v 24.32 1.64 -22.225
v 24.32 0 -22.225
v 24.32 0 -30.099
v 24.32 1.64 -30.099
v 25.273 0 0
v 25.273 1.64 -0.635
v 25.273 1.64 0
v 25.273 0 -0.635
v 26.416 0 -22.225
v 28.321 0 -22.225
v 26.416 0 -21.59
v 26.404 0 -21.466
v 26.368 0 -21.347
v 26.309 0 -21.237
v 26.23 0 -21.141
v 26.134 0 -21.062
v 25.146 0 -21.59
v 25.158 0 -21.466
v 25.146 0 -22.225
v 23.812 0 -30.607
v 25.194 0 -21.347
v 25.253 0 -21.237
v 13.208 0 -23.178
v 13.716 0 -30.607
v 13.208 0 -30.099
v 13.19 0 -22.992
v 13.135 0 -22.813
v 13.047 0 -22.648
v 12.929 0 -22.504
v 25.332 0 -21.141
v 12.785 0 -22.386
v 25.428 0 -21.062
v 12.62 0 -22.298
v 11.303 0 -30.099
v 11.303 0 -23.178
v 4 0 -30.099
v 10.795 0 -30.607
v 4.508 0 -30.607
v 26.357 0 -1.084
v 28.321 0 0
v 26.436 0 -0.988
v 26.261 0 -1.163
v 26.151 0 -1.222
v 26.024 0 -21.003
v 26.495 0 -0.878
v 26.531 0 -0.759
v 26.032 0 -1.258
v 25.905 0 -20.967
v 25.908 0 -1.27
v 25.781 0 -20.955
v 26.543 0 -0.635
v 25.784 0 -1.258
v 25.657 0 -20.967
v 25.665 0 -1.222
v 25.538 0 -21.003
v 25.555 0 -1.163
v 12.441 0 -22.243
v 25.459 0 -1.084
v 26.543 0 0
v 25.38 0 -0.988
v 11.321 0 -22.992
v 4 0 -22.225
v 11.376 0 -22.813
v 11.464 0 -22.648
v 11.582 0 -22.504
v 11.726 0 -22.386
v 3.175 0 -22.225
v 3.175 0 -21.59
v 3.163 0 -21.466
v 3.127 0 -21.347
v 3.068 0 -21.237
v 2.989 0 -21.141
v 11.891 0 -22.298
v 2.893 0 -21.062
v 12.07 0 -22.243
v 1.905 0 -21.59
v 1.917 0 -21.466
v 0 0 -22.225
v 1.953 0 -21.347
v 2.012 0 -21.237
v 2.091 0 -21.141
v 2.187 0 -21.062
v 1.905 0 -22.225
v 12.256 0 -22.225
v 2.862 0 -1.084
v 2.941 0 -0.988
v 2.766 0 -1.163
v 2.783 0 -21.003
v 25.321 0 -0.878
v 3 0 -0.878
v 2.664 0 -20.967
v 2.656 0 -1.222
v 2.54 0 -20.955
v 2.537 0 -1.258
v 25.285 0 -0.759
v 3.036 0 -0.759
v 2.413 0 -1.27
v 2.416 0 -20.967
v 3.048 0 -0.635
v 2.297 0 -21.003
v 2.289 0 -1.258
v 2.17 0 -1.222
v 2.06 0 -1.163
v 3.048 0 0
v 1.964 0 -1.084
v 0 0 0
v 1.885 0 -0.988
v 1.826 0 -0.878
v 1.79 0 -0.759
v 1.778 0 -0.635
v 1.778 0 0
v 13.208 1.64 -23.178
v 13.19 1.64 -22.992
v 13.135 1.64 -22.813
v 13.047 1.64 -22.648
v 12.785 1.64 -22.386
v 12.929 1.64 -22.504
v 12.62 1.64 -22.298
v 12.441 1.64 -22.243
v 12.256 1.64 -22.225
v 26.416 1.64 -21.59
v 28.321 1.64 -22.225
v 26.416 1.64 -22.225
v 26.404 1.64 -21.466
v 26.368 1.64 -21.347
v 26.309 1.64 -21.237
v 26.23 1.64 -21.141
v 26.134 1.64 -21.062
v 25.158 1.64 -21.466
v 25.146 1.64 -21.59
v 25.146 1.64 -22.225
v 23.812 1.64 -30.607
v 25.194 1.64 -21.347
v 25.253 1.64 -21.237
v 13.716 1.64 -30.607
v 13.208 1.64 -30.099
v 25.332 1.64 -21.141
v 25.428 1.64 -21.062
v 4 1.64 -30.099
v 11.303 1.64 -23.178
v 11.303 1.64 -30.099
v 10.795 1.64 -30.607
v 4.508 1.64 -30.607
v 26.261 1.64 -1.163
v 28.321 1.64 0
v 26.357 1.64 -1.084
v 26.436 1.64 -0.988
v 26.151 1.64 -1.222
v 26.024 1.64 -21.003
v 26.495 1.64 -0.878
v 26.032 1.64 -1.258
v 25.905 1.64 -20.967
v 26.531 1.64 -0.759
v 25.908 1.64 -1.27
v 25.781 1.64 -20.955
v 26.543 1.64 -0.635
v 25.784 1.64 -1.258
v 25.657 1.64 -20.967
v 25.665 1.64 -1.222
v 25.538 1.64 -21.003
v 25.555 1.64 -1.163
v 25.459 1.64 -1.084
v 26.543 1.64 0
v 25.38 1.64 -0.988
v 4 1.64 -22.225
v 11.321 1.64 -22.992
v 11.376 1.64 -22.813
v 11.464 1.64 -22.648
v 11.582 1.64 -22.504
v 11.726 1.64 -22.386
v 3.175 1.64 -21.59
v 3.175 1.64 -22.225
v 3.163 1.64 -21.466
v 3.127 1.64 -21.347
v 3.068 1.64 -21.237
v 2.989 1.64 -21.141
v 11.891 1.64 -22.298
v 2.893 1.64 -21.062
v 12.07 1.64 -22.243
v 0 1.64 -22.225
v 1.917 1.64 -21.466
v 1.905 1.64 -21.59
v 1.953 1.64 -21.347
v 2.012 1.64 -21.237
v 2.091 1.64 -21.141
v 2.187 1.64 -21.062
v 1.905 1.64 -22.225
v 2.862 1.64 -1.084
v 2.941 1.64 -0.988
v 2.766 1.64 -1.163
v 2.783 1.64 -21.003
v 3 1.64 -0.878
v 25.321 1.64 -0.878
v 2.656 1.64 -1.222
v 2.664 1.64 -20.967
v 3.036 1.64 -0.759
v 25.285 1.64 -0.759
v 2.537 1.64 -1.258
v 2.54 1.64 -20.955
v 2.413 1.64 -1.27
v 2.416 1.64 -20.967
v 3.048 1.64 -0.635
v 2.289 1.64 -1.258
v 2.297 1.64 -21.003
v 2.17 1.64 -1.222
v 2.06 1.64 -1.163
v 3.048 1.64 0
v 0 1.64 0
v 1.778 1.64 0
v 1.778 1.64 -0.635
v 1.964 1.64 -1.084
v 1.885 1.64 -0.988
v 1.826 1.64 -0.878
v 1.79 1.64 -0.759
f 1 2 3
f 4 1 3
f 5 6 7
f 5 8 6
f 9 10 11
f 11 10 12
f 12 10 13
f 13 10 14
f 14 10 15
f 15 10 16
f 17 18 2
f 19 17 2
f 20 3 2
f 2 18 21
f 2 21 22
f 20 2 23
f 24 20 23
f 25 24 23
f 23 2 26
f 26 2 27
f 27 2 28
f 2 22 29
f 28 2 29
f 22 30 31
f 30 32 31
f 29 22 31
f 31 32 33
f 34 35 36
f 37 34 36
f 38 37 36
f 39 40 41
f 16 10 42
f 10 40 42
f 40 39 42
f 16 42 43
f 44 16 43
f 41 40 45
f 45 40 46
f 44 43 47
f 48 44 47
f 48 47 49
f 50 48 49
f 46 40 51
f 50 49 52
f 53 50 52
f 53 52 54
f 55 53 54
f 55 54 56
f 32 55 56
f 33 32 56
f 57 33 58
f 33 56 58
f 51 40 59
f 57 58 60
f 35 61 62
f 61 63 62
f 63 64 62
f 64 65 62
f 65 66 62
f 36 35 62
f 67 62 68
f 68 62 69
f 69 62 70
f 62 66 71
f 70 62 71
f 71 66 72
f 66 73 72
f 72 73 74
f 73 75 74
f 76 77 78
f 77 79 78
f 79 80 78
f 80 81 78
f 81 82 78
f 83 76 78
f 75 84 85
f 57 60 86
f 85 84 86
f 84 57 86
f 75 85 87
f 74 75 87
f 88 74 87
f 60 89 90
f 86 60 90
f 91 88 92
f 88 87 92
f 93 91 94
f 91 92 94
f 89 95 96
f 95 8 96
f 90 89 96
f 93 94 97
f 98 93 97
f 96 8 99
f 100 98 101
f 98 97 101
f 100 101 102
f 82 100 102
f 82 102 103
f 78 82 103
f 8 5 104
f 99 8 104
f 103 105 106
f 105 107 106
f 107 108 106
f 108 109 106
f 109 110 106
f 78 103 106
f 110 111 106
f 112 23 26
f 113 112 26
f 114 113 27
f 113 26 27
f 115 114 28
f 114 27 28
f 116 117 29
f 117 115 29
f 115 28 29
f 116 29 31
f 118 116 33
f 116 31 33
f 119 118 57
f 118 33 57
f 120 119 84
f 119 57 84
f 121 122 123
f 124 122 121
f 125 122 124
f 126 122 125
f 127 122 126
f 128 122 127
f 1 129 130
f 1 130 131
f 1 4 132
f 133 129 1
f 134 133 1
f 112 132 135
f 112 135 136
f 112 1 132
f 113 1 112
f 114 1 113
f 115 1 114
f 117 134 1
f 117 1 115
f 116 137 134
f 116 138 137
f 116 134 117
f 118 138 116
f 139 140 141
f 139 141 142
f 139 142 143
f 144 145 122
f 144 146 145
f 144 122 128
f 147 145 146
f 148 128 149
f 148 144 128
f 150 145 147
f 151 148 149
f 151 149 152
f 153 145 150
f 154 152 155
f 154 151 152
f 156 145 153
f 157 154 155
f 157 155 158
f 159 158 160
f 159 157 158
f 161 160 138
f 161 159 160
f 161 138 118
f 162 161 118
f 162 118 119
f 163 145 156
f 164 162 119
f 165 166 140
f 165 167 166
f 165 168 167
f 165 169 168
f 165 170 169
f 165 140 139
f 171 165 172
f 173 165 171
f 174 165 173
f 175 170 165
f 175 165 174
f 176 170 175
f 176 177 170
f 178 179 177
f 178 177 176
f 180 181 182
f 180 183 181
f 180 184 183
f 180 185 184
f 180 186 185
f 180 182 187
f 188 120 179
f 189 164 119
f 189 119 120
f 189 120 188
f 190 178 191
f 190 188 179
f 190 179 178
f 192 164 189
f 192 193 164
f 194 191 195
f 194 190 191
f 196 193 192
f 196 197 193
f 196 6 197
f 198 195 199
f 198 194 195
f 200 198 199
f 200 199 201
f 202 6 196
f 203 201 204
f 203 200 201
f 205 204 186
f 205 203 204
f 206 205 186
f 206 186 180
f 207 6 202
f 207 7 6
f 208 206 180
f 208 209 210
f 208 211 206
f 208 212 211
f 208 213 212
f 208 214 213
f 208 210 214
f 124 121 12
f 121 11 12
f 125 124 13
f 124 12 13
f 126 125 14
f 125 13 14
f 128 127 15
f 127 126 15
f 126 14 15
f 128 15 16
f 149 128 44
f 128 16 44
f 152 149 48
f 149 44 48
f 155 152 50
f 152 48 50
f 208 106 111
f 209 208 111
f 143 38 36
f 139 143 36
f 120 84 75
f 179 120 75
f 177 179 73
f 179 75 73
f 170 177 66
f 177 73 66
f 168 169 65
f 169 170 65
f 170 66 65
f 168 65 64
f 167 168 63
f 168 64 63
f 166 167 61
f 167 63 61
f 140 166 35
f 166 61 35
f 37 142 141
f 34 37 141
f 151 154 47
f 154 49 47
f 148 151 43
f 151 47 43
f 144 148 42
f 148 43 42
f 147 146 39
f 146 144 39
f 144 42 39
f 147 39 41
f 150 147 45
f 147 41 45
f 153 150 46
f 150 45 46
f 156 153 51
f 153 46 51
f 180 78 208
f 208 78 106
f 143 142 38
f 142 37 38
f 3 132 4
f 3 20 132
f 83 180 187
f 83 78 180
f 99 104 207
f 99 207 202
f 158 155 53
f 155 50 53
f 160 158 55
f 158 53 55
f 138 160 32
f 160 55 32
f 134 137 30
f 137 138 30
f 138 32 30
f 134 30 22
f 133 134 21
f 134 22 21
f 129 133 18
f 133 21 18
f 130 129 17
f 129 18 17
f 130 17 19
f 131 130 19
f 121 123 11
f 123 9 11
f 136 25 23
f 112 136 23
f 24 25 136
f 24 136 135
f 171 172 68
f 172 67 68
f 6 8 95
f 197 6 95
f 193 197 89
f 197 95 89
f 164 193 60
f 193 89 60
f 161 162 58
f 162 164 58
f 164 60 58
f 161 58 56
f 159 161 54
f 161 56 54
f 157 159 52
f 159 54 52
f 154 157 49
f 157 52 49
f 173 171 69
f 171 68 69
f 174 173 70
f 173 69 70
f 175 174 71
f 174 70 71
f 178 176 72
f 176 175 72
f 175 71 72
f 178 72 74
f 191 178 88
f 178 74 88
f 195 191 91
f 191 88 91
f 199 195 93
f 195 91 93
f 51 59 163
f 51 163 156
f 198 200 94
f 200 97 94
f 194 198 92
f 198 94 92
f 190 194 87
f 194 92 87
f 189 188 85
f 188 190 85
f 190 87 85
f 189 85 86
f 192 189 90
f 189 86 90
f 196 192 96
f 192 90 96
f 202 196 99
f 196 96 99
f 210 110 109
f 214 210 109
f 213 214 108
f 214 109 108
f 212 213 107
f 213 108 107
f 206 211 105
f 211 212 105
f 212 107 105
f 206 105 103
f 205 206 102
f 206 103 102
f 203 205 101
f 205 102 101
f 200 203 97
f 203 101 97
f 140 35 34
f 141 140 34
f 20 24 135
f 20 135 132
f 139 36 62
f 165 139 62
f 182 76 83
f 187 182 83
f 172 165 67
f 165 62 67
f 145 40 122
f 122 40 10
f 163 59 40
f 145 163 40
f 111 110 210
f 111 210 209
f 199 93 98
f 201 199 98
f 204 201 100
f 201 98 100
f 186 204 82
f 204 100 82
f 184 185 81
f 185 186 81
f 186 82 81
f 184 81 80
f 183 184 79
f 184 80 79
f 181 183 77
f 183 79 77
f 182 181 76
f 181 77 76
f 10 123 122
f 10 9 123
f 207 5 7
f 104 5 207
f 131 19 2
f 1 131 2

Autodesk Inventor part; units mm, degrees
ref_plane "YZ Plane" through (0, 0, 0) normal (1, 0, 0) x (0, 1, 0)
ref_plane "XZ Plane" through (0, 0, 0) normal (0, 1, 0) x (-1, 0, 0)
ref_plane "XY Plane" through (0, 0, 0) normal (0, 0, 1) x (1, 0, 0)
sketch "Sketch1" plane through (0, 0, 0) normal (0, 1, 0) x (-1, 0, 0)
  line L0 (0, 0) -> (-28.321, 0) construction
  line L1 (-28.321, 0) -> (-28.321, -22.225)
  line L2 (-28.321, -22.225) -> (0, -22.225) construction
  line L3 (0, -22.225) -> (0, 0)
  line L4 (-1.778, 0) -> (-3.048, 0) construction
  line L5 (-3.048, 0) -> (-3.048, -0.635)
  line L6 (-2.413, -1.27) -> (-2.413, -1.27)
  line L7 (-1.778, -0.635) -> (-1.778, 0)
  arc A0 (-2.413, -1.27) -> (-1.778, -0.635) centre (-2.413, -0.635) ccw
  arc A1 (-3.048, -0.635) -> (-2.413, -1.27) centre (-2.413, -0.635) ccw
  line L8 (0, 0) -> (-1.778, 0)
  line L9 (0, -11.1125) -> (-6.6148, -11.1125) construction
  line L10 (-14.1605, -22.225) -> (-14.1605, -12.0846) construction
  line L11 (-25.273, 0) -> (-26.543, 0) construction
  line L12 (-26.543, 0) -> (-26.543, -0.635)
  line L13 (-25.908, -1.27) -> (-25.908, -1.27)
  line L14 (-25.273, -0.635) -> (-25.273, 0)
  arc A2 (-25.908, -1.27) -> (-25.273, -0.635) centre (-25.908, -0.635) ccw
  arc A3 (-26.543, -0.635) -> (-25.908, -1.27) centre (-25.908, -0.635) ccw
  line L15 (-26.543, 0) -> (-28.321, 0)
  line L16 (-25.273, 0) -> (-3.048, 0)
  line L17 (-25.146, -22.225) -> (-26.416, -22.225) construction
  line L18 (-26.416, -22.225) -> (-26.416, -21.59)
  line L19 (-25.781, -20.955) -> (-25.781, -20.955)
  line L20 (-25.146, -21.59) -> (-25.146, -22.225)
  line L21 (-1.905, -22.225) -> (-3.175, -22.225) construction
  line L22 (-3.175, -22.225) -> (-3.175, -21.59)
  line L23 (-2.54, -20.955) -> (-2.54, -20.955)
  line L24 (-1.905, -21.59) -> (-1.905, -22.225)
  line L25 (0, -22.225) -> (-1.905, -22.225)
  arc A4 (-1.905, -21.59) -> (-2.54, -20.955) centre (-2.54, -21.59) ccw
  arc A5 (-2.54, -20.955) -> (-3.175, -21.59) centre (-2.54, -21.59) ccw
  arc A6 (-25.146, -21.59) -> (-25.781, -20.955) centre (-25.781, -21.59) ccw
  arc A7 (-25.781, -20.955) -> (-26.416, -21.59) centre (-25.781, -21.59) ccw
  line L26 (-26.416, -22.225) -> (-28.321, -22.225)
  line L27 (-4.0005, -22.225) -> (-24.3205, -22.225) construction
  line L28 (-24.3205, -22.225) -> (-24.3205, -30.099)
  line L29 (-23.8125, -30.607) -> (-4.5085, -30.607) construction
  line L30 (-4.0005, -30.099) -> (-4.0005, -22.225)
  line L31 (-4.5085, -30.607) -> (-4.0005, -30.099)
  line L32 (-23.8125, -30.607) -> (-24.3205, -30.099)
  line L33 (-11.303, -30.607) -> (-13.208, -30.607) construction
  line L34 (-13.208, -30.099) -> (-13.208, -23.1775)
  line L35 (-12.2555, -22.225) -> (-12.2555, -22.225)
  line L36 (-11.303, -23.1775) -> (-11.303, -30.099)
  arc A8 (-12.2555, -22.225) -> (-13.208, -23.1775) centre (-12.2555, -23.1775) ccw
  arc A9 (-11.303, -23.1775) -> (-12.2555, -22.225) centre (-12.2555, -23.1775) ccw
  line L37 (-13.716, -30.607) -> (-23.8125, -30.607)
  line L38 (-10.795, -30.607) -> (-4.5085, -30.607)
  line L39 (-4.0005, -22.225) -> (-3.175, -22.225)
  line L40 (-25.146, -22.225) -> (-24.3205, -22.225)
  line L41 (-10.795, -30.607) -> (-11.303, -30.099)
  line L42 (-13.208, -30.099) -> (-13.716, -30.607)
  point P0 (-2.413, 0)
  point P1 (-26.543, -1.27)
  point P2 (-25.273, -1.27)
  point P3 (-25.908, 0)
  point P4 (-2.54, -22.225)
  point P5 (-25.781, -22.225)
  point P6 (-24.3205, -30.607)
  point P7 (-4.0005, -30.607)
  point P8 (-13.208, -22.225)
  dimension "d0" = 22.225
  dimension "d1" = 28.321
  dimension "d2" = 1.27
  dimension "d3" = 2.413
  dimension "d4" = 1.27
  dimension "d5" = 0.635
  dimension "d6" = 1.27
  dimension "d7" = 1.27
  dimension "d8" = 2.413
  dimension "d9" = 0.635
  dimension "d12" = 1.27
  dimension "d13" = 1.27
  dimension "d14" = 1.27
  dimension "d15" = 1.27
  dimension "d16" = 2.54
  dimension "d17" = 0.635
  dimension "d18" = 2.54
  dimension "d19" = 0.635
  dimension "d20" = 20.32
  dimension "d21" = 0.508
  dimension "d22" = 0.508
  dimension "d23" = 0.508
  dimension "d24" = 0.508
  dimension "d25" = 8.382
  dimension "d26" = 1.905
  dimension "d27" = 0.9525
  dimension "d28" = 8.255
  dimension "d29" = 0.508
  dimension "d30" = 0.508
  dimension "d31" = 0.508
  dimension "d32" = 0.508
  dimension "d40" = 23.495
extrude "Extrusion1" add sketch "Sketch1" along normal blind 1.64
sketch "Sketch2" plane through (0, 1.64, 0) normal (0, 1, 0) x (1, 0, 0)
  line L0 (6, -1) -> (22.321, -1)
  line L1 (22.321, -1) -> (22.321, 6)
  line L2 (22.321, 6) -> (6, 6)
  line L3 (6, 6) -> (6, -1)
  line L4 (0, 22.225) -> (0, 0) projected
  line L5 (28.321, 0) -> (28.321, 22.225) projected
  line L6 (3.048, 0) -> (25.273, 0) projected
  dimension "d35" = 7
  dimension "d36" = 6
  dimension "d37" = 6
  dimension "d38" = 1
equation "\"d22\" = d21"
equation "\"d23\" = d21"
equation "\"d24\" = d23"
equation "\"d30\" = d29"
equation "\"d31\" = d29"
equation "\"d32\" = d31"
properties part number "HDMI Plugin Module"
